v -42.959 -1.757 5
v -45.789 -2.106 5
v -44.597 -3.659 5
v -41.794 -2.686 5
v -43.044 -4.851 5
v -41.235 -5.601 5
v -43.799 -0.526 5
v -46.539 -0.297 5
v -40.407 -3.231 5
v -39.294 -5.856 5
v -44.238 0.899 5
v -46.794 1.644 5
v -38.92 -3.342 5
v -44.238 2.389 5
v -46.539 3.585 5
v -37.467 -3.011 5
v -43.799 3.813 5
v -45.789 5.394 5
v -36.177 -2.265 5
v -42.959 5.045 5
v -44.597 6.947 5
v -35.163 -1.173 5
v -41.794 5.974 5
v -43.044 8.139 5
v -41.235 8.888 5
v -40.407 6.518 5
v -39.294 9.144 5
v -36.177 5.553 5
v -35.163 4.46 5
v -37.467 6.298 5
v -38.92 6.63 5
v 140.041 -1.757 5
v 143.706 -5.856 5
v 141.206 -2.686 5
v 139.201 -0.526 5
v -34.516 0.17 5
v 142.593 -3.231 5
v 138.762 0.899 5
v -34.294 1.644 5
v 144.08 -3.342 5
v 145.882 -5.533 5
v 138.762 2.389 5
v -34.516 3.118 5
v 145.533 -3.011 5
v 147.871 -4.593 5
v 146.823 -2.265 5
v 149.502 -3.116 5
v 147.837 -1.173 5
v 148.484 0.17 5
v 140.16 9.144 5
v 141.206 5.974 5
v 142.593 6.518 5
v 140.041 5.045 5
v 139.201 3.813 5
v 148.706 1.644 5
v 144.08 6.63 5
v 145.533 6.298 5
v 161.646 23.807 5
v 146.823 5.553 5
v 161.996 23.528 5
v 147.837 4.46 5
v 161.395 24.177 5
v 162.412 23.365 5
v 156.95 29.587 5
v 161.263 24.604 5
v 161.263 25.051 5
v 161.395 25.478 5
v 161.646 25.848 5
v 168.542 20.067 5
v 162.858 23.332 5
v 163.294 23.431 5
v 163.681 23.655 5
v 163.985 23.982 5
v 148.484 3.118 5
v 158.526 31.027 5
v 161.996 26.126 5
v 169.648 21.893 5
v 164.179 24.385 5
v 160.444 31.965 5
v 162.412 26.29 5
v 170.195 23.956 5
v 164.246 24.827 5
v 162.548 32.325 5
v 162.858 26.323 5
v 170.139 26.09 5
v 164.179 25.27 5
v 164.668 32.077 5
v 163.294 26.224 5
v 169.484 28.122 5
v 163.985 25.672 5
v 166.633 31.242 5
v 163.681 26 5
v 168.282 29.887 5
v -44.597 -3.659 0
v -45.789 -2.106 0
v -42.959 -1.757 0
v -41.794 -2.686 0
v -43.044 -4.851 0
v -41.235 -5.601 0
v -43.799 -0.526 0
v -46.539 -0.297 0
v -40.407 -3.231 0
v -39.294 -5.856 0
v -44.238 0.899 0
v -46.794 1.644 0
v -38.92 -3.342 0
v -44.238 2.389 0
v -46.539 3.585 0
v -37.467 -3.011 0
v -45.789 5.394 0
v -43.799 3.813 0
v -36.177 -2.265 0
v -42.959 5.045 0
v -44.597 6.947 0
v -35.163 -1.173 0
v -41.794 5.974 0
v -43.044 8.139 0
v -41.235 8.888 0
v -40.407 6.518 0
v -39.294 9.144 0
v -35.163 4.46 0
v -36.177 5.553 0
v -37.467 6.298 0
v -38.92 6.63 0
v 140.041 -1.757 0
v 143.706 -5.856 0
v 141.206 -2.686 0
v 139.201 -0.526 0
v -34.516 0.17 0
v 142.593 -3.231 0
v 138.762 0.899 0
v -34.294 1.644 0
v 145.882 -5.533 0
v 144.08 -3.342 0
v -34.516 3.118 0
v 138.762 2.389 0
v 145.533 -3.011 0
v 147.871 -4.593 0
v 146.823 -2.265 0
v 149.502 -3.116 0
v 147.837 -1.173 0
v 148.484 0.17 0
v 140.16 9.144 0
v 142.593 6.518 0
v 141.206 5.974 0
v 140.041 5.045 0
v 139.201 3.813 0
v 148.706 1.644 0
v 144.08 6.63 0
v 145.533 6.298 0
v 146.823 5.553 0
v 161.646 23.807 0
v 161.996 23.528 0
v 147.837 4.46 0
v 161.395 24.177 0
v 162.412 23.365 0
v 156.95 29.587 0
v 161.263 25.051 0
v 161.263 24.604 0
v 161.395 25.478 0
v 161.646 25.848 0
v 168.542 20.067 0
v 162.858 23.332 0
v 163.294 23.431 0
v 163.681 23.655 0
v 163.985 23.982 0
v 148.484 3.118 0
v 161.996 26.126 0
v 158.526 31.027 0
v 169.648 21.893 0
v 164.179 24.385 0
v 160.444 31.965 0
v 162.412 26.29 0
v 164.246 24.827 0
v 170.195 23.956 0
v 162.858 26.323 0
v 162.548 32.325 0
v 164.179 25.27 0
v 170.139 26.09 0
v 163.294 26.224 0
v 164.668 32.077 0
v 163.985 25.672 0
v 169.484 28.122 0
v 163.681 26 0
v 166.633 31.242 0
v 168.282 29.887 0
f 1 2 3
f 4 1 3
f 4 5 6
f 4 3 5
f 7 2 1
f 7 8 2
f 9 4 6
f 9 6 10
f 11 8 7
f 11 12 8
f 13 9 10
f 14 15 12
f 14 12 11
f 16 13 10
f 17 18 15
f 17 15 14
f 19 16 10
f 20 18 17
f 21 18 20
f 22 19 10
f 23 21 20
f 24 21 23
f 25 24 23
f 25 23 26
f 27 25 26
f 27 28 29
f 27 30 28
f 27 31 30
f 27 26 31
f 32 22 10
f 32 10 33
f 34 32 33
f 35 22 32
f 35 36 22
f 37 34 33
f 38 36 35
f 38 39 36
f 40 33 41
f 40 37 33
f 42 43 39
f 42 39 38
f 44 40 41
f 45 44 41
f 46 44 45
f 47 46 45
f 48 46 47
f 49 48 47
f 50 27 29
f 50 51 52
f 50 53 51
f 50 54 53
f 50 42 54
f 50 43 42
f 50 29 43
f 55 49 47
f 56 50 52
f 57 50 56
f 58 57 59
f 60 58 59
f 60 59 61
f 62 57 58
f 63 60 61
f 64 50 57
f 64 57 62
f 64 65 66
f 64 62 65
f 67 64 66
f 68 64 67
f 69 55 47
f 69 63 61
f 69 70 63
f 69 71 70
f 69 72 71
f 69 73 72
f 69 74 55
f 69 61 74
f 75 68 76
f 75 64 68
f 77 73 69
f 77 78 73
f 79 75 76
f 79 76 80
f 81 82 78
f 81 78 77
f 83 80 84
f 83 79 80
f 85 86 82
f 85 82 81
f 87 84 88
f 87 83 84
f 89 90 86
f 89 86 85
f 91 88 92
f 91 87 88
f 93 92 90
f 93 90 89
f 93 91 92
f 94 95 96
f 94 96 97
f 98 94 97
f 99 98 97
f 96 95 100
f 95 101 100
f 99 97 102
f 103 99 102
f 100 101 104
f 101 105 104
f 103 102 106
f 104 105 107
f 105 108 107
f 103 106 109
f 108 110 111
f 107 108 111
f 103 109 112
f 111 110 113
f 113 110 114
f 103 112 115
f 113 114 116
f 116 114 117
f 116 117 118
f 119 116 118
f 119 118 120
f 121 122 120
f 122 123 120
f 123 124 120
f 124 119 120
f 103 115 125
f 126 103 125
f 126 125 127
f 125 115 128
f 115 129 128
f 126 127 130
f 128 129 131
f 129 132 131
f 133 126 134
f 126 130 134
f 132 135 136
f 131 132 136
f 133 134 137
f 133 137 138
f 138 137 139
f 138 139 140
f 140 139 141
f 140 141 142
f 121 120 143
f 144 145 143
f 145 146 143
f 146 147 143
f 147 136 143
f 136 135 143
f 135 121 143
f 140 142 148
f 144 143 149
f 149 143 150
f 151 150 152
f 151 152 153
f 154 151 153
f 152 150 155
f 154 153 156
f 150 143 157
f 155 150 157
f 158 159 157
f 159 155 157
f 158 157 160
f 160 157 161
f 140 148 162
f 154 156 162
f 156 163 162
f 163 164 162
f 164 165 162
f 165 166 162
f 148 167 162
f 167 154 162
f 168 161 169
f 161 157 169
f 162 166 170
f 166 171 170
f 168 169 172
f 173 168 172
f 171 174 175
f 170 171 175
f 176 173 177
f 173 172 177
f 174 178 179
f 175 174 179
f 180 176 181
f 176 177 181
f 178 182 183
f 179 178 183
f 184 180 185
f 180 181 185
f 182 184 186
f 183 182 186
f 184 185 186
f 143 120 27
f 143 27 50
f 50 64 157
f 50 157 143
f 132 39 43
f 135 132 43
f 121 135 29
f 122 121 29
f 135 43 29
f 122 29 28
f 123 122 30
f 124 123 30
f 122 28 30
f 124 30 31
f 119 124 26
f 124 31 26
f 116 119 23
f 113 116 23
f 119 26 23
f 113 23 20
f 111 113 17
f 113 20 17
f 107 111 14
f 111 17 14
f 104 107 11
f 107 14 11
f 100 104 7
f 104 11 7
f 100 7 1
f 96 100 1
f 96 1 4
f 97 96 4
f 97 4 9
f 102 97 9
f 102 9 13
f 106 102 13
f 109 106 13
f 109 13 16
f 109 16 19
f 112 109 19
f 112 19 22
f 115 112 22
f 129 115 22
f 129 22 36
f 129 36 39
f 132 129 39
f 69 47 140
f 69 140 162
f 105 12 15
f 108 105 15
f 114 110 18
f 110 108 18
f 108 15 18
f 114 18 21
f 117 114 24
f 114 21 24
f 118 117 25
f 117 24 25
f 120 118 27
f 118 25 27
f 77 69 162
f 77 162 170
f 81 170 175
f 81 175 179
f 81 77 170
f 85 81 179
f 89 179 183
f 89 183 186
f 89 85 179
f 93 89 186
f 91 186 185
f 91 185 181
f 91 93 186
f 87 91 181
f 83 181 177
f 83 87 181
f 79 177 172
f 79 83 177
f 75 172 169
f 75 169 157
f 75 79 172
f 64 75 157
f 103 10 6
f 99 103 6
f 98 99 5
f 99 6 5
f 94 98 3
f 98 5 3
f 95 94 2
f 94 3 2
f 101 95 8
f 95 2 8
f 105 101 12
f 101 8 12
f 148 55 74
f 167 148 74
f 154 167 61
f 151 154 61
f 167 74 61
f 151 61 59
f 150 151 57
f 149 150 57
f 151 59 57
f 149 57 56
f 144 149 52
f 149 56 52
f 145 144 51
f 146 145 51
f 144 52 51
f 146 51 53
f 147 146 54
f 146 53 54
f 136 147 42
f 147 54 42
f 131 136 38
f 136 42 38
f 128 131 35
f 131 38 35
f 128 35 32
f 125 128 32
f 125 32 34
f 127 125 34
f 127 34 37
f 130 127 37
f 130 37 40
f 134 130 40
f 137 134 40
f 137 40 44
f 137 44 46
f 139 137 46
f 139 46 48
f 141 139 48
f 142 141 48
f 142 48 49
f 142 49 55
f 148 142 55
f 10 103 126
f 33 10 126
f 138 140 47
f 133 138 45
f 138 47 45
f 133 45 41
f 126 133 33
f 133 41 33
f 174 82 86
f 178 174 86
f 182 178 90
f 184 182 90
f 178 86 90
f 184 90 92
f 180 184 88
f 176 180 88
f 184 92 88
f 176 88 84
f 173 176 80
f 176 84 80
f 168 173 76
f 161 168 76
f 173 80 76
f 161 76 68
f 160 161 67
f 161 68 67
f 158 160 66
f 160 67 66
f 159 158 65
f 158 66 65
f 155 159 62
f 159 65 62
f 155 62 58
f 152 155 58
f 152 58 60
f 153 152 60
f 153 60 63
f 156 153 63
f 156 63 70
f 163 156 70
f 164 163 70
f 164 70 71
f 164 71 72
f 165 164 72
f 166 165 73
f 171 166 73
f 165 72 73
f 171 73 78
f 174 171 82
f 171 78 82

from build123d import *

# Parameters (mm, degrees)
SKETCH1_W           = 198
SKETCH1_H           = 15
BOSS_EXTRUDE1_DEPTH = 5
SKETCH2_R           = 5
CUT_EXTRUDE1_DEPTH  = 6
SKETCH3_R           = 1.5
BOSS_EXTRUDE2_DEPTH = 5


with BuildPart() as part:
    # Sketch1 → Boss-Extrude1 (new body)
    with BuildSketch(Plane.XY):
        with Locations((52.20591631, 1.643835616)):
            Rectangle(SKETCH1_W, SKETCH1_H)
    extrude(amount=BOSS_EXTRUDE1_DEPTH)

    # Sketch2 → Cut-Extrude1 (cut, through all)
    with BuildSketch(Plane.XY.offset(5)):
        with BuildLine():
            Line((-39.29408369, 9.143835616), (-46.79408369, 9.143835616))
            Line((-46.79408369, 9.143835616), (-46.79408369, 1.643835616))
            ThreePointArc((-46.79408369, 1.643835616), (-44.597384548, 6.947136475), (-39.29408369, 9.143835616))
        make_face()
        with BuildLine():
            ThreePointArc((-39.29408369, -5.856164384), (-44.597384548, -3.659465242), (-46.79408369, 1.643835616))
            Line((-46.79408369, 1.643835616), (-46.79408369, -5.856164384))
            Line((-46.79408369, -5.856164384), (-39.29408369, -5.856164384))
        make_face()
        with BuildLine():
            Line((151.20591631, 9.143835616), (143.70591631, 9.143835616))
            ThreePointArc((143.70591631, 9.143835616), (149.009217169, 6.947136475), (151.20591631, 1.643835616))
            Line((151.20591631, 1.643835616), (151.20591631, 9.143835616))
        make_face()
        with BuildLine():
            ThreePointArc((151.20591631, 1.643835616), (149.009217169, -3.659465242), (143.70591631, -5.856164384))
            Line((143.70591631, -5.856164384), (151.20591631, -5.856164384))
            Line((151.20591631, -5.856164384), (151.20591631, 1.643835616))
        make_face()
        with Locations((-39.29408369, 1.643835616)):
            Circle(SKETCH2_R)
        with Locations((143.70591631, 1.643835616)):
            Circle(SKETCH2_R)
    extrude(amount=-CUT_EXTRUDE1_DEPTH, mode=Mode.SUBTRACT)

    # Sketch3 → Boss-Extrude2 (add)
    with BuildSketch(Plane.XY.offset(5)):
        with BuildLine():
            ThreePointArc((143.70591631, 9.143835616), (150.486406082, 4.849293221), (149.50180231, -3.116175463))
            Line((149.50180231, -3.116175463), (168.541846628, 20.067368536))
            ThreePointArc((168.541846628, 20.067368536), (167.505971708, 30.623265615), (156.950074629, 29.587390695))
            Line((156.950074629, 29.587390695), (140.160312255, 9.143835616))
            Line((140.160312255, 9.143835616), (143.70591631, 9.143835616))
        make_face()
        with Locations((162.745960629, 24.827379616)):
            Circle(SKETCH3_R, mode=Mode.SUBTRACT)
    extrude(amount=-BOSS_EXTRUDE2_DEPTH)


solid = part.part
